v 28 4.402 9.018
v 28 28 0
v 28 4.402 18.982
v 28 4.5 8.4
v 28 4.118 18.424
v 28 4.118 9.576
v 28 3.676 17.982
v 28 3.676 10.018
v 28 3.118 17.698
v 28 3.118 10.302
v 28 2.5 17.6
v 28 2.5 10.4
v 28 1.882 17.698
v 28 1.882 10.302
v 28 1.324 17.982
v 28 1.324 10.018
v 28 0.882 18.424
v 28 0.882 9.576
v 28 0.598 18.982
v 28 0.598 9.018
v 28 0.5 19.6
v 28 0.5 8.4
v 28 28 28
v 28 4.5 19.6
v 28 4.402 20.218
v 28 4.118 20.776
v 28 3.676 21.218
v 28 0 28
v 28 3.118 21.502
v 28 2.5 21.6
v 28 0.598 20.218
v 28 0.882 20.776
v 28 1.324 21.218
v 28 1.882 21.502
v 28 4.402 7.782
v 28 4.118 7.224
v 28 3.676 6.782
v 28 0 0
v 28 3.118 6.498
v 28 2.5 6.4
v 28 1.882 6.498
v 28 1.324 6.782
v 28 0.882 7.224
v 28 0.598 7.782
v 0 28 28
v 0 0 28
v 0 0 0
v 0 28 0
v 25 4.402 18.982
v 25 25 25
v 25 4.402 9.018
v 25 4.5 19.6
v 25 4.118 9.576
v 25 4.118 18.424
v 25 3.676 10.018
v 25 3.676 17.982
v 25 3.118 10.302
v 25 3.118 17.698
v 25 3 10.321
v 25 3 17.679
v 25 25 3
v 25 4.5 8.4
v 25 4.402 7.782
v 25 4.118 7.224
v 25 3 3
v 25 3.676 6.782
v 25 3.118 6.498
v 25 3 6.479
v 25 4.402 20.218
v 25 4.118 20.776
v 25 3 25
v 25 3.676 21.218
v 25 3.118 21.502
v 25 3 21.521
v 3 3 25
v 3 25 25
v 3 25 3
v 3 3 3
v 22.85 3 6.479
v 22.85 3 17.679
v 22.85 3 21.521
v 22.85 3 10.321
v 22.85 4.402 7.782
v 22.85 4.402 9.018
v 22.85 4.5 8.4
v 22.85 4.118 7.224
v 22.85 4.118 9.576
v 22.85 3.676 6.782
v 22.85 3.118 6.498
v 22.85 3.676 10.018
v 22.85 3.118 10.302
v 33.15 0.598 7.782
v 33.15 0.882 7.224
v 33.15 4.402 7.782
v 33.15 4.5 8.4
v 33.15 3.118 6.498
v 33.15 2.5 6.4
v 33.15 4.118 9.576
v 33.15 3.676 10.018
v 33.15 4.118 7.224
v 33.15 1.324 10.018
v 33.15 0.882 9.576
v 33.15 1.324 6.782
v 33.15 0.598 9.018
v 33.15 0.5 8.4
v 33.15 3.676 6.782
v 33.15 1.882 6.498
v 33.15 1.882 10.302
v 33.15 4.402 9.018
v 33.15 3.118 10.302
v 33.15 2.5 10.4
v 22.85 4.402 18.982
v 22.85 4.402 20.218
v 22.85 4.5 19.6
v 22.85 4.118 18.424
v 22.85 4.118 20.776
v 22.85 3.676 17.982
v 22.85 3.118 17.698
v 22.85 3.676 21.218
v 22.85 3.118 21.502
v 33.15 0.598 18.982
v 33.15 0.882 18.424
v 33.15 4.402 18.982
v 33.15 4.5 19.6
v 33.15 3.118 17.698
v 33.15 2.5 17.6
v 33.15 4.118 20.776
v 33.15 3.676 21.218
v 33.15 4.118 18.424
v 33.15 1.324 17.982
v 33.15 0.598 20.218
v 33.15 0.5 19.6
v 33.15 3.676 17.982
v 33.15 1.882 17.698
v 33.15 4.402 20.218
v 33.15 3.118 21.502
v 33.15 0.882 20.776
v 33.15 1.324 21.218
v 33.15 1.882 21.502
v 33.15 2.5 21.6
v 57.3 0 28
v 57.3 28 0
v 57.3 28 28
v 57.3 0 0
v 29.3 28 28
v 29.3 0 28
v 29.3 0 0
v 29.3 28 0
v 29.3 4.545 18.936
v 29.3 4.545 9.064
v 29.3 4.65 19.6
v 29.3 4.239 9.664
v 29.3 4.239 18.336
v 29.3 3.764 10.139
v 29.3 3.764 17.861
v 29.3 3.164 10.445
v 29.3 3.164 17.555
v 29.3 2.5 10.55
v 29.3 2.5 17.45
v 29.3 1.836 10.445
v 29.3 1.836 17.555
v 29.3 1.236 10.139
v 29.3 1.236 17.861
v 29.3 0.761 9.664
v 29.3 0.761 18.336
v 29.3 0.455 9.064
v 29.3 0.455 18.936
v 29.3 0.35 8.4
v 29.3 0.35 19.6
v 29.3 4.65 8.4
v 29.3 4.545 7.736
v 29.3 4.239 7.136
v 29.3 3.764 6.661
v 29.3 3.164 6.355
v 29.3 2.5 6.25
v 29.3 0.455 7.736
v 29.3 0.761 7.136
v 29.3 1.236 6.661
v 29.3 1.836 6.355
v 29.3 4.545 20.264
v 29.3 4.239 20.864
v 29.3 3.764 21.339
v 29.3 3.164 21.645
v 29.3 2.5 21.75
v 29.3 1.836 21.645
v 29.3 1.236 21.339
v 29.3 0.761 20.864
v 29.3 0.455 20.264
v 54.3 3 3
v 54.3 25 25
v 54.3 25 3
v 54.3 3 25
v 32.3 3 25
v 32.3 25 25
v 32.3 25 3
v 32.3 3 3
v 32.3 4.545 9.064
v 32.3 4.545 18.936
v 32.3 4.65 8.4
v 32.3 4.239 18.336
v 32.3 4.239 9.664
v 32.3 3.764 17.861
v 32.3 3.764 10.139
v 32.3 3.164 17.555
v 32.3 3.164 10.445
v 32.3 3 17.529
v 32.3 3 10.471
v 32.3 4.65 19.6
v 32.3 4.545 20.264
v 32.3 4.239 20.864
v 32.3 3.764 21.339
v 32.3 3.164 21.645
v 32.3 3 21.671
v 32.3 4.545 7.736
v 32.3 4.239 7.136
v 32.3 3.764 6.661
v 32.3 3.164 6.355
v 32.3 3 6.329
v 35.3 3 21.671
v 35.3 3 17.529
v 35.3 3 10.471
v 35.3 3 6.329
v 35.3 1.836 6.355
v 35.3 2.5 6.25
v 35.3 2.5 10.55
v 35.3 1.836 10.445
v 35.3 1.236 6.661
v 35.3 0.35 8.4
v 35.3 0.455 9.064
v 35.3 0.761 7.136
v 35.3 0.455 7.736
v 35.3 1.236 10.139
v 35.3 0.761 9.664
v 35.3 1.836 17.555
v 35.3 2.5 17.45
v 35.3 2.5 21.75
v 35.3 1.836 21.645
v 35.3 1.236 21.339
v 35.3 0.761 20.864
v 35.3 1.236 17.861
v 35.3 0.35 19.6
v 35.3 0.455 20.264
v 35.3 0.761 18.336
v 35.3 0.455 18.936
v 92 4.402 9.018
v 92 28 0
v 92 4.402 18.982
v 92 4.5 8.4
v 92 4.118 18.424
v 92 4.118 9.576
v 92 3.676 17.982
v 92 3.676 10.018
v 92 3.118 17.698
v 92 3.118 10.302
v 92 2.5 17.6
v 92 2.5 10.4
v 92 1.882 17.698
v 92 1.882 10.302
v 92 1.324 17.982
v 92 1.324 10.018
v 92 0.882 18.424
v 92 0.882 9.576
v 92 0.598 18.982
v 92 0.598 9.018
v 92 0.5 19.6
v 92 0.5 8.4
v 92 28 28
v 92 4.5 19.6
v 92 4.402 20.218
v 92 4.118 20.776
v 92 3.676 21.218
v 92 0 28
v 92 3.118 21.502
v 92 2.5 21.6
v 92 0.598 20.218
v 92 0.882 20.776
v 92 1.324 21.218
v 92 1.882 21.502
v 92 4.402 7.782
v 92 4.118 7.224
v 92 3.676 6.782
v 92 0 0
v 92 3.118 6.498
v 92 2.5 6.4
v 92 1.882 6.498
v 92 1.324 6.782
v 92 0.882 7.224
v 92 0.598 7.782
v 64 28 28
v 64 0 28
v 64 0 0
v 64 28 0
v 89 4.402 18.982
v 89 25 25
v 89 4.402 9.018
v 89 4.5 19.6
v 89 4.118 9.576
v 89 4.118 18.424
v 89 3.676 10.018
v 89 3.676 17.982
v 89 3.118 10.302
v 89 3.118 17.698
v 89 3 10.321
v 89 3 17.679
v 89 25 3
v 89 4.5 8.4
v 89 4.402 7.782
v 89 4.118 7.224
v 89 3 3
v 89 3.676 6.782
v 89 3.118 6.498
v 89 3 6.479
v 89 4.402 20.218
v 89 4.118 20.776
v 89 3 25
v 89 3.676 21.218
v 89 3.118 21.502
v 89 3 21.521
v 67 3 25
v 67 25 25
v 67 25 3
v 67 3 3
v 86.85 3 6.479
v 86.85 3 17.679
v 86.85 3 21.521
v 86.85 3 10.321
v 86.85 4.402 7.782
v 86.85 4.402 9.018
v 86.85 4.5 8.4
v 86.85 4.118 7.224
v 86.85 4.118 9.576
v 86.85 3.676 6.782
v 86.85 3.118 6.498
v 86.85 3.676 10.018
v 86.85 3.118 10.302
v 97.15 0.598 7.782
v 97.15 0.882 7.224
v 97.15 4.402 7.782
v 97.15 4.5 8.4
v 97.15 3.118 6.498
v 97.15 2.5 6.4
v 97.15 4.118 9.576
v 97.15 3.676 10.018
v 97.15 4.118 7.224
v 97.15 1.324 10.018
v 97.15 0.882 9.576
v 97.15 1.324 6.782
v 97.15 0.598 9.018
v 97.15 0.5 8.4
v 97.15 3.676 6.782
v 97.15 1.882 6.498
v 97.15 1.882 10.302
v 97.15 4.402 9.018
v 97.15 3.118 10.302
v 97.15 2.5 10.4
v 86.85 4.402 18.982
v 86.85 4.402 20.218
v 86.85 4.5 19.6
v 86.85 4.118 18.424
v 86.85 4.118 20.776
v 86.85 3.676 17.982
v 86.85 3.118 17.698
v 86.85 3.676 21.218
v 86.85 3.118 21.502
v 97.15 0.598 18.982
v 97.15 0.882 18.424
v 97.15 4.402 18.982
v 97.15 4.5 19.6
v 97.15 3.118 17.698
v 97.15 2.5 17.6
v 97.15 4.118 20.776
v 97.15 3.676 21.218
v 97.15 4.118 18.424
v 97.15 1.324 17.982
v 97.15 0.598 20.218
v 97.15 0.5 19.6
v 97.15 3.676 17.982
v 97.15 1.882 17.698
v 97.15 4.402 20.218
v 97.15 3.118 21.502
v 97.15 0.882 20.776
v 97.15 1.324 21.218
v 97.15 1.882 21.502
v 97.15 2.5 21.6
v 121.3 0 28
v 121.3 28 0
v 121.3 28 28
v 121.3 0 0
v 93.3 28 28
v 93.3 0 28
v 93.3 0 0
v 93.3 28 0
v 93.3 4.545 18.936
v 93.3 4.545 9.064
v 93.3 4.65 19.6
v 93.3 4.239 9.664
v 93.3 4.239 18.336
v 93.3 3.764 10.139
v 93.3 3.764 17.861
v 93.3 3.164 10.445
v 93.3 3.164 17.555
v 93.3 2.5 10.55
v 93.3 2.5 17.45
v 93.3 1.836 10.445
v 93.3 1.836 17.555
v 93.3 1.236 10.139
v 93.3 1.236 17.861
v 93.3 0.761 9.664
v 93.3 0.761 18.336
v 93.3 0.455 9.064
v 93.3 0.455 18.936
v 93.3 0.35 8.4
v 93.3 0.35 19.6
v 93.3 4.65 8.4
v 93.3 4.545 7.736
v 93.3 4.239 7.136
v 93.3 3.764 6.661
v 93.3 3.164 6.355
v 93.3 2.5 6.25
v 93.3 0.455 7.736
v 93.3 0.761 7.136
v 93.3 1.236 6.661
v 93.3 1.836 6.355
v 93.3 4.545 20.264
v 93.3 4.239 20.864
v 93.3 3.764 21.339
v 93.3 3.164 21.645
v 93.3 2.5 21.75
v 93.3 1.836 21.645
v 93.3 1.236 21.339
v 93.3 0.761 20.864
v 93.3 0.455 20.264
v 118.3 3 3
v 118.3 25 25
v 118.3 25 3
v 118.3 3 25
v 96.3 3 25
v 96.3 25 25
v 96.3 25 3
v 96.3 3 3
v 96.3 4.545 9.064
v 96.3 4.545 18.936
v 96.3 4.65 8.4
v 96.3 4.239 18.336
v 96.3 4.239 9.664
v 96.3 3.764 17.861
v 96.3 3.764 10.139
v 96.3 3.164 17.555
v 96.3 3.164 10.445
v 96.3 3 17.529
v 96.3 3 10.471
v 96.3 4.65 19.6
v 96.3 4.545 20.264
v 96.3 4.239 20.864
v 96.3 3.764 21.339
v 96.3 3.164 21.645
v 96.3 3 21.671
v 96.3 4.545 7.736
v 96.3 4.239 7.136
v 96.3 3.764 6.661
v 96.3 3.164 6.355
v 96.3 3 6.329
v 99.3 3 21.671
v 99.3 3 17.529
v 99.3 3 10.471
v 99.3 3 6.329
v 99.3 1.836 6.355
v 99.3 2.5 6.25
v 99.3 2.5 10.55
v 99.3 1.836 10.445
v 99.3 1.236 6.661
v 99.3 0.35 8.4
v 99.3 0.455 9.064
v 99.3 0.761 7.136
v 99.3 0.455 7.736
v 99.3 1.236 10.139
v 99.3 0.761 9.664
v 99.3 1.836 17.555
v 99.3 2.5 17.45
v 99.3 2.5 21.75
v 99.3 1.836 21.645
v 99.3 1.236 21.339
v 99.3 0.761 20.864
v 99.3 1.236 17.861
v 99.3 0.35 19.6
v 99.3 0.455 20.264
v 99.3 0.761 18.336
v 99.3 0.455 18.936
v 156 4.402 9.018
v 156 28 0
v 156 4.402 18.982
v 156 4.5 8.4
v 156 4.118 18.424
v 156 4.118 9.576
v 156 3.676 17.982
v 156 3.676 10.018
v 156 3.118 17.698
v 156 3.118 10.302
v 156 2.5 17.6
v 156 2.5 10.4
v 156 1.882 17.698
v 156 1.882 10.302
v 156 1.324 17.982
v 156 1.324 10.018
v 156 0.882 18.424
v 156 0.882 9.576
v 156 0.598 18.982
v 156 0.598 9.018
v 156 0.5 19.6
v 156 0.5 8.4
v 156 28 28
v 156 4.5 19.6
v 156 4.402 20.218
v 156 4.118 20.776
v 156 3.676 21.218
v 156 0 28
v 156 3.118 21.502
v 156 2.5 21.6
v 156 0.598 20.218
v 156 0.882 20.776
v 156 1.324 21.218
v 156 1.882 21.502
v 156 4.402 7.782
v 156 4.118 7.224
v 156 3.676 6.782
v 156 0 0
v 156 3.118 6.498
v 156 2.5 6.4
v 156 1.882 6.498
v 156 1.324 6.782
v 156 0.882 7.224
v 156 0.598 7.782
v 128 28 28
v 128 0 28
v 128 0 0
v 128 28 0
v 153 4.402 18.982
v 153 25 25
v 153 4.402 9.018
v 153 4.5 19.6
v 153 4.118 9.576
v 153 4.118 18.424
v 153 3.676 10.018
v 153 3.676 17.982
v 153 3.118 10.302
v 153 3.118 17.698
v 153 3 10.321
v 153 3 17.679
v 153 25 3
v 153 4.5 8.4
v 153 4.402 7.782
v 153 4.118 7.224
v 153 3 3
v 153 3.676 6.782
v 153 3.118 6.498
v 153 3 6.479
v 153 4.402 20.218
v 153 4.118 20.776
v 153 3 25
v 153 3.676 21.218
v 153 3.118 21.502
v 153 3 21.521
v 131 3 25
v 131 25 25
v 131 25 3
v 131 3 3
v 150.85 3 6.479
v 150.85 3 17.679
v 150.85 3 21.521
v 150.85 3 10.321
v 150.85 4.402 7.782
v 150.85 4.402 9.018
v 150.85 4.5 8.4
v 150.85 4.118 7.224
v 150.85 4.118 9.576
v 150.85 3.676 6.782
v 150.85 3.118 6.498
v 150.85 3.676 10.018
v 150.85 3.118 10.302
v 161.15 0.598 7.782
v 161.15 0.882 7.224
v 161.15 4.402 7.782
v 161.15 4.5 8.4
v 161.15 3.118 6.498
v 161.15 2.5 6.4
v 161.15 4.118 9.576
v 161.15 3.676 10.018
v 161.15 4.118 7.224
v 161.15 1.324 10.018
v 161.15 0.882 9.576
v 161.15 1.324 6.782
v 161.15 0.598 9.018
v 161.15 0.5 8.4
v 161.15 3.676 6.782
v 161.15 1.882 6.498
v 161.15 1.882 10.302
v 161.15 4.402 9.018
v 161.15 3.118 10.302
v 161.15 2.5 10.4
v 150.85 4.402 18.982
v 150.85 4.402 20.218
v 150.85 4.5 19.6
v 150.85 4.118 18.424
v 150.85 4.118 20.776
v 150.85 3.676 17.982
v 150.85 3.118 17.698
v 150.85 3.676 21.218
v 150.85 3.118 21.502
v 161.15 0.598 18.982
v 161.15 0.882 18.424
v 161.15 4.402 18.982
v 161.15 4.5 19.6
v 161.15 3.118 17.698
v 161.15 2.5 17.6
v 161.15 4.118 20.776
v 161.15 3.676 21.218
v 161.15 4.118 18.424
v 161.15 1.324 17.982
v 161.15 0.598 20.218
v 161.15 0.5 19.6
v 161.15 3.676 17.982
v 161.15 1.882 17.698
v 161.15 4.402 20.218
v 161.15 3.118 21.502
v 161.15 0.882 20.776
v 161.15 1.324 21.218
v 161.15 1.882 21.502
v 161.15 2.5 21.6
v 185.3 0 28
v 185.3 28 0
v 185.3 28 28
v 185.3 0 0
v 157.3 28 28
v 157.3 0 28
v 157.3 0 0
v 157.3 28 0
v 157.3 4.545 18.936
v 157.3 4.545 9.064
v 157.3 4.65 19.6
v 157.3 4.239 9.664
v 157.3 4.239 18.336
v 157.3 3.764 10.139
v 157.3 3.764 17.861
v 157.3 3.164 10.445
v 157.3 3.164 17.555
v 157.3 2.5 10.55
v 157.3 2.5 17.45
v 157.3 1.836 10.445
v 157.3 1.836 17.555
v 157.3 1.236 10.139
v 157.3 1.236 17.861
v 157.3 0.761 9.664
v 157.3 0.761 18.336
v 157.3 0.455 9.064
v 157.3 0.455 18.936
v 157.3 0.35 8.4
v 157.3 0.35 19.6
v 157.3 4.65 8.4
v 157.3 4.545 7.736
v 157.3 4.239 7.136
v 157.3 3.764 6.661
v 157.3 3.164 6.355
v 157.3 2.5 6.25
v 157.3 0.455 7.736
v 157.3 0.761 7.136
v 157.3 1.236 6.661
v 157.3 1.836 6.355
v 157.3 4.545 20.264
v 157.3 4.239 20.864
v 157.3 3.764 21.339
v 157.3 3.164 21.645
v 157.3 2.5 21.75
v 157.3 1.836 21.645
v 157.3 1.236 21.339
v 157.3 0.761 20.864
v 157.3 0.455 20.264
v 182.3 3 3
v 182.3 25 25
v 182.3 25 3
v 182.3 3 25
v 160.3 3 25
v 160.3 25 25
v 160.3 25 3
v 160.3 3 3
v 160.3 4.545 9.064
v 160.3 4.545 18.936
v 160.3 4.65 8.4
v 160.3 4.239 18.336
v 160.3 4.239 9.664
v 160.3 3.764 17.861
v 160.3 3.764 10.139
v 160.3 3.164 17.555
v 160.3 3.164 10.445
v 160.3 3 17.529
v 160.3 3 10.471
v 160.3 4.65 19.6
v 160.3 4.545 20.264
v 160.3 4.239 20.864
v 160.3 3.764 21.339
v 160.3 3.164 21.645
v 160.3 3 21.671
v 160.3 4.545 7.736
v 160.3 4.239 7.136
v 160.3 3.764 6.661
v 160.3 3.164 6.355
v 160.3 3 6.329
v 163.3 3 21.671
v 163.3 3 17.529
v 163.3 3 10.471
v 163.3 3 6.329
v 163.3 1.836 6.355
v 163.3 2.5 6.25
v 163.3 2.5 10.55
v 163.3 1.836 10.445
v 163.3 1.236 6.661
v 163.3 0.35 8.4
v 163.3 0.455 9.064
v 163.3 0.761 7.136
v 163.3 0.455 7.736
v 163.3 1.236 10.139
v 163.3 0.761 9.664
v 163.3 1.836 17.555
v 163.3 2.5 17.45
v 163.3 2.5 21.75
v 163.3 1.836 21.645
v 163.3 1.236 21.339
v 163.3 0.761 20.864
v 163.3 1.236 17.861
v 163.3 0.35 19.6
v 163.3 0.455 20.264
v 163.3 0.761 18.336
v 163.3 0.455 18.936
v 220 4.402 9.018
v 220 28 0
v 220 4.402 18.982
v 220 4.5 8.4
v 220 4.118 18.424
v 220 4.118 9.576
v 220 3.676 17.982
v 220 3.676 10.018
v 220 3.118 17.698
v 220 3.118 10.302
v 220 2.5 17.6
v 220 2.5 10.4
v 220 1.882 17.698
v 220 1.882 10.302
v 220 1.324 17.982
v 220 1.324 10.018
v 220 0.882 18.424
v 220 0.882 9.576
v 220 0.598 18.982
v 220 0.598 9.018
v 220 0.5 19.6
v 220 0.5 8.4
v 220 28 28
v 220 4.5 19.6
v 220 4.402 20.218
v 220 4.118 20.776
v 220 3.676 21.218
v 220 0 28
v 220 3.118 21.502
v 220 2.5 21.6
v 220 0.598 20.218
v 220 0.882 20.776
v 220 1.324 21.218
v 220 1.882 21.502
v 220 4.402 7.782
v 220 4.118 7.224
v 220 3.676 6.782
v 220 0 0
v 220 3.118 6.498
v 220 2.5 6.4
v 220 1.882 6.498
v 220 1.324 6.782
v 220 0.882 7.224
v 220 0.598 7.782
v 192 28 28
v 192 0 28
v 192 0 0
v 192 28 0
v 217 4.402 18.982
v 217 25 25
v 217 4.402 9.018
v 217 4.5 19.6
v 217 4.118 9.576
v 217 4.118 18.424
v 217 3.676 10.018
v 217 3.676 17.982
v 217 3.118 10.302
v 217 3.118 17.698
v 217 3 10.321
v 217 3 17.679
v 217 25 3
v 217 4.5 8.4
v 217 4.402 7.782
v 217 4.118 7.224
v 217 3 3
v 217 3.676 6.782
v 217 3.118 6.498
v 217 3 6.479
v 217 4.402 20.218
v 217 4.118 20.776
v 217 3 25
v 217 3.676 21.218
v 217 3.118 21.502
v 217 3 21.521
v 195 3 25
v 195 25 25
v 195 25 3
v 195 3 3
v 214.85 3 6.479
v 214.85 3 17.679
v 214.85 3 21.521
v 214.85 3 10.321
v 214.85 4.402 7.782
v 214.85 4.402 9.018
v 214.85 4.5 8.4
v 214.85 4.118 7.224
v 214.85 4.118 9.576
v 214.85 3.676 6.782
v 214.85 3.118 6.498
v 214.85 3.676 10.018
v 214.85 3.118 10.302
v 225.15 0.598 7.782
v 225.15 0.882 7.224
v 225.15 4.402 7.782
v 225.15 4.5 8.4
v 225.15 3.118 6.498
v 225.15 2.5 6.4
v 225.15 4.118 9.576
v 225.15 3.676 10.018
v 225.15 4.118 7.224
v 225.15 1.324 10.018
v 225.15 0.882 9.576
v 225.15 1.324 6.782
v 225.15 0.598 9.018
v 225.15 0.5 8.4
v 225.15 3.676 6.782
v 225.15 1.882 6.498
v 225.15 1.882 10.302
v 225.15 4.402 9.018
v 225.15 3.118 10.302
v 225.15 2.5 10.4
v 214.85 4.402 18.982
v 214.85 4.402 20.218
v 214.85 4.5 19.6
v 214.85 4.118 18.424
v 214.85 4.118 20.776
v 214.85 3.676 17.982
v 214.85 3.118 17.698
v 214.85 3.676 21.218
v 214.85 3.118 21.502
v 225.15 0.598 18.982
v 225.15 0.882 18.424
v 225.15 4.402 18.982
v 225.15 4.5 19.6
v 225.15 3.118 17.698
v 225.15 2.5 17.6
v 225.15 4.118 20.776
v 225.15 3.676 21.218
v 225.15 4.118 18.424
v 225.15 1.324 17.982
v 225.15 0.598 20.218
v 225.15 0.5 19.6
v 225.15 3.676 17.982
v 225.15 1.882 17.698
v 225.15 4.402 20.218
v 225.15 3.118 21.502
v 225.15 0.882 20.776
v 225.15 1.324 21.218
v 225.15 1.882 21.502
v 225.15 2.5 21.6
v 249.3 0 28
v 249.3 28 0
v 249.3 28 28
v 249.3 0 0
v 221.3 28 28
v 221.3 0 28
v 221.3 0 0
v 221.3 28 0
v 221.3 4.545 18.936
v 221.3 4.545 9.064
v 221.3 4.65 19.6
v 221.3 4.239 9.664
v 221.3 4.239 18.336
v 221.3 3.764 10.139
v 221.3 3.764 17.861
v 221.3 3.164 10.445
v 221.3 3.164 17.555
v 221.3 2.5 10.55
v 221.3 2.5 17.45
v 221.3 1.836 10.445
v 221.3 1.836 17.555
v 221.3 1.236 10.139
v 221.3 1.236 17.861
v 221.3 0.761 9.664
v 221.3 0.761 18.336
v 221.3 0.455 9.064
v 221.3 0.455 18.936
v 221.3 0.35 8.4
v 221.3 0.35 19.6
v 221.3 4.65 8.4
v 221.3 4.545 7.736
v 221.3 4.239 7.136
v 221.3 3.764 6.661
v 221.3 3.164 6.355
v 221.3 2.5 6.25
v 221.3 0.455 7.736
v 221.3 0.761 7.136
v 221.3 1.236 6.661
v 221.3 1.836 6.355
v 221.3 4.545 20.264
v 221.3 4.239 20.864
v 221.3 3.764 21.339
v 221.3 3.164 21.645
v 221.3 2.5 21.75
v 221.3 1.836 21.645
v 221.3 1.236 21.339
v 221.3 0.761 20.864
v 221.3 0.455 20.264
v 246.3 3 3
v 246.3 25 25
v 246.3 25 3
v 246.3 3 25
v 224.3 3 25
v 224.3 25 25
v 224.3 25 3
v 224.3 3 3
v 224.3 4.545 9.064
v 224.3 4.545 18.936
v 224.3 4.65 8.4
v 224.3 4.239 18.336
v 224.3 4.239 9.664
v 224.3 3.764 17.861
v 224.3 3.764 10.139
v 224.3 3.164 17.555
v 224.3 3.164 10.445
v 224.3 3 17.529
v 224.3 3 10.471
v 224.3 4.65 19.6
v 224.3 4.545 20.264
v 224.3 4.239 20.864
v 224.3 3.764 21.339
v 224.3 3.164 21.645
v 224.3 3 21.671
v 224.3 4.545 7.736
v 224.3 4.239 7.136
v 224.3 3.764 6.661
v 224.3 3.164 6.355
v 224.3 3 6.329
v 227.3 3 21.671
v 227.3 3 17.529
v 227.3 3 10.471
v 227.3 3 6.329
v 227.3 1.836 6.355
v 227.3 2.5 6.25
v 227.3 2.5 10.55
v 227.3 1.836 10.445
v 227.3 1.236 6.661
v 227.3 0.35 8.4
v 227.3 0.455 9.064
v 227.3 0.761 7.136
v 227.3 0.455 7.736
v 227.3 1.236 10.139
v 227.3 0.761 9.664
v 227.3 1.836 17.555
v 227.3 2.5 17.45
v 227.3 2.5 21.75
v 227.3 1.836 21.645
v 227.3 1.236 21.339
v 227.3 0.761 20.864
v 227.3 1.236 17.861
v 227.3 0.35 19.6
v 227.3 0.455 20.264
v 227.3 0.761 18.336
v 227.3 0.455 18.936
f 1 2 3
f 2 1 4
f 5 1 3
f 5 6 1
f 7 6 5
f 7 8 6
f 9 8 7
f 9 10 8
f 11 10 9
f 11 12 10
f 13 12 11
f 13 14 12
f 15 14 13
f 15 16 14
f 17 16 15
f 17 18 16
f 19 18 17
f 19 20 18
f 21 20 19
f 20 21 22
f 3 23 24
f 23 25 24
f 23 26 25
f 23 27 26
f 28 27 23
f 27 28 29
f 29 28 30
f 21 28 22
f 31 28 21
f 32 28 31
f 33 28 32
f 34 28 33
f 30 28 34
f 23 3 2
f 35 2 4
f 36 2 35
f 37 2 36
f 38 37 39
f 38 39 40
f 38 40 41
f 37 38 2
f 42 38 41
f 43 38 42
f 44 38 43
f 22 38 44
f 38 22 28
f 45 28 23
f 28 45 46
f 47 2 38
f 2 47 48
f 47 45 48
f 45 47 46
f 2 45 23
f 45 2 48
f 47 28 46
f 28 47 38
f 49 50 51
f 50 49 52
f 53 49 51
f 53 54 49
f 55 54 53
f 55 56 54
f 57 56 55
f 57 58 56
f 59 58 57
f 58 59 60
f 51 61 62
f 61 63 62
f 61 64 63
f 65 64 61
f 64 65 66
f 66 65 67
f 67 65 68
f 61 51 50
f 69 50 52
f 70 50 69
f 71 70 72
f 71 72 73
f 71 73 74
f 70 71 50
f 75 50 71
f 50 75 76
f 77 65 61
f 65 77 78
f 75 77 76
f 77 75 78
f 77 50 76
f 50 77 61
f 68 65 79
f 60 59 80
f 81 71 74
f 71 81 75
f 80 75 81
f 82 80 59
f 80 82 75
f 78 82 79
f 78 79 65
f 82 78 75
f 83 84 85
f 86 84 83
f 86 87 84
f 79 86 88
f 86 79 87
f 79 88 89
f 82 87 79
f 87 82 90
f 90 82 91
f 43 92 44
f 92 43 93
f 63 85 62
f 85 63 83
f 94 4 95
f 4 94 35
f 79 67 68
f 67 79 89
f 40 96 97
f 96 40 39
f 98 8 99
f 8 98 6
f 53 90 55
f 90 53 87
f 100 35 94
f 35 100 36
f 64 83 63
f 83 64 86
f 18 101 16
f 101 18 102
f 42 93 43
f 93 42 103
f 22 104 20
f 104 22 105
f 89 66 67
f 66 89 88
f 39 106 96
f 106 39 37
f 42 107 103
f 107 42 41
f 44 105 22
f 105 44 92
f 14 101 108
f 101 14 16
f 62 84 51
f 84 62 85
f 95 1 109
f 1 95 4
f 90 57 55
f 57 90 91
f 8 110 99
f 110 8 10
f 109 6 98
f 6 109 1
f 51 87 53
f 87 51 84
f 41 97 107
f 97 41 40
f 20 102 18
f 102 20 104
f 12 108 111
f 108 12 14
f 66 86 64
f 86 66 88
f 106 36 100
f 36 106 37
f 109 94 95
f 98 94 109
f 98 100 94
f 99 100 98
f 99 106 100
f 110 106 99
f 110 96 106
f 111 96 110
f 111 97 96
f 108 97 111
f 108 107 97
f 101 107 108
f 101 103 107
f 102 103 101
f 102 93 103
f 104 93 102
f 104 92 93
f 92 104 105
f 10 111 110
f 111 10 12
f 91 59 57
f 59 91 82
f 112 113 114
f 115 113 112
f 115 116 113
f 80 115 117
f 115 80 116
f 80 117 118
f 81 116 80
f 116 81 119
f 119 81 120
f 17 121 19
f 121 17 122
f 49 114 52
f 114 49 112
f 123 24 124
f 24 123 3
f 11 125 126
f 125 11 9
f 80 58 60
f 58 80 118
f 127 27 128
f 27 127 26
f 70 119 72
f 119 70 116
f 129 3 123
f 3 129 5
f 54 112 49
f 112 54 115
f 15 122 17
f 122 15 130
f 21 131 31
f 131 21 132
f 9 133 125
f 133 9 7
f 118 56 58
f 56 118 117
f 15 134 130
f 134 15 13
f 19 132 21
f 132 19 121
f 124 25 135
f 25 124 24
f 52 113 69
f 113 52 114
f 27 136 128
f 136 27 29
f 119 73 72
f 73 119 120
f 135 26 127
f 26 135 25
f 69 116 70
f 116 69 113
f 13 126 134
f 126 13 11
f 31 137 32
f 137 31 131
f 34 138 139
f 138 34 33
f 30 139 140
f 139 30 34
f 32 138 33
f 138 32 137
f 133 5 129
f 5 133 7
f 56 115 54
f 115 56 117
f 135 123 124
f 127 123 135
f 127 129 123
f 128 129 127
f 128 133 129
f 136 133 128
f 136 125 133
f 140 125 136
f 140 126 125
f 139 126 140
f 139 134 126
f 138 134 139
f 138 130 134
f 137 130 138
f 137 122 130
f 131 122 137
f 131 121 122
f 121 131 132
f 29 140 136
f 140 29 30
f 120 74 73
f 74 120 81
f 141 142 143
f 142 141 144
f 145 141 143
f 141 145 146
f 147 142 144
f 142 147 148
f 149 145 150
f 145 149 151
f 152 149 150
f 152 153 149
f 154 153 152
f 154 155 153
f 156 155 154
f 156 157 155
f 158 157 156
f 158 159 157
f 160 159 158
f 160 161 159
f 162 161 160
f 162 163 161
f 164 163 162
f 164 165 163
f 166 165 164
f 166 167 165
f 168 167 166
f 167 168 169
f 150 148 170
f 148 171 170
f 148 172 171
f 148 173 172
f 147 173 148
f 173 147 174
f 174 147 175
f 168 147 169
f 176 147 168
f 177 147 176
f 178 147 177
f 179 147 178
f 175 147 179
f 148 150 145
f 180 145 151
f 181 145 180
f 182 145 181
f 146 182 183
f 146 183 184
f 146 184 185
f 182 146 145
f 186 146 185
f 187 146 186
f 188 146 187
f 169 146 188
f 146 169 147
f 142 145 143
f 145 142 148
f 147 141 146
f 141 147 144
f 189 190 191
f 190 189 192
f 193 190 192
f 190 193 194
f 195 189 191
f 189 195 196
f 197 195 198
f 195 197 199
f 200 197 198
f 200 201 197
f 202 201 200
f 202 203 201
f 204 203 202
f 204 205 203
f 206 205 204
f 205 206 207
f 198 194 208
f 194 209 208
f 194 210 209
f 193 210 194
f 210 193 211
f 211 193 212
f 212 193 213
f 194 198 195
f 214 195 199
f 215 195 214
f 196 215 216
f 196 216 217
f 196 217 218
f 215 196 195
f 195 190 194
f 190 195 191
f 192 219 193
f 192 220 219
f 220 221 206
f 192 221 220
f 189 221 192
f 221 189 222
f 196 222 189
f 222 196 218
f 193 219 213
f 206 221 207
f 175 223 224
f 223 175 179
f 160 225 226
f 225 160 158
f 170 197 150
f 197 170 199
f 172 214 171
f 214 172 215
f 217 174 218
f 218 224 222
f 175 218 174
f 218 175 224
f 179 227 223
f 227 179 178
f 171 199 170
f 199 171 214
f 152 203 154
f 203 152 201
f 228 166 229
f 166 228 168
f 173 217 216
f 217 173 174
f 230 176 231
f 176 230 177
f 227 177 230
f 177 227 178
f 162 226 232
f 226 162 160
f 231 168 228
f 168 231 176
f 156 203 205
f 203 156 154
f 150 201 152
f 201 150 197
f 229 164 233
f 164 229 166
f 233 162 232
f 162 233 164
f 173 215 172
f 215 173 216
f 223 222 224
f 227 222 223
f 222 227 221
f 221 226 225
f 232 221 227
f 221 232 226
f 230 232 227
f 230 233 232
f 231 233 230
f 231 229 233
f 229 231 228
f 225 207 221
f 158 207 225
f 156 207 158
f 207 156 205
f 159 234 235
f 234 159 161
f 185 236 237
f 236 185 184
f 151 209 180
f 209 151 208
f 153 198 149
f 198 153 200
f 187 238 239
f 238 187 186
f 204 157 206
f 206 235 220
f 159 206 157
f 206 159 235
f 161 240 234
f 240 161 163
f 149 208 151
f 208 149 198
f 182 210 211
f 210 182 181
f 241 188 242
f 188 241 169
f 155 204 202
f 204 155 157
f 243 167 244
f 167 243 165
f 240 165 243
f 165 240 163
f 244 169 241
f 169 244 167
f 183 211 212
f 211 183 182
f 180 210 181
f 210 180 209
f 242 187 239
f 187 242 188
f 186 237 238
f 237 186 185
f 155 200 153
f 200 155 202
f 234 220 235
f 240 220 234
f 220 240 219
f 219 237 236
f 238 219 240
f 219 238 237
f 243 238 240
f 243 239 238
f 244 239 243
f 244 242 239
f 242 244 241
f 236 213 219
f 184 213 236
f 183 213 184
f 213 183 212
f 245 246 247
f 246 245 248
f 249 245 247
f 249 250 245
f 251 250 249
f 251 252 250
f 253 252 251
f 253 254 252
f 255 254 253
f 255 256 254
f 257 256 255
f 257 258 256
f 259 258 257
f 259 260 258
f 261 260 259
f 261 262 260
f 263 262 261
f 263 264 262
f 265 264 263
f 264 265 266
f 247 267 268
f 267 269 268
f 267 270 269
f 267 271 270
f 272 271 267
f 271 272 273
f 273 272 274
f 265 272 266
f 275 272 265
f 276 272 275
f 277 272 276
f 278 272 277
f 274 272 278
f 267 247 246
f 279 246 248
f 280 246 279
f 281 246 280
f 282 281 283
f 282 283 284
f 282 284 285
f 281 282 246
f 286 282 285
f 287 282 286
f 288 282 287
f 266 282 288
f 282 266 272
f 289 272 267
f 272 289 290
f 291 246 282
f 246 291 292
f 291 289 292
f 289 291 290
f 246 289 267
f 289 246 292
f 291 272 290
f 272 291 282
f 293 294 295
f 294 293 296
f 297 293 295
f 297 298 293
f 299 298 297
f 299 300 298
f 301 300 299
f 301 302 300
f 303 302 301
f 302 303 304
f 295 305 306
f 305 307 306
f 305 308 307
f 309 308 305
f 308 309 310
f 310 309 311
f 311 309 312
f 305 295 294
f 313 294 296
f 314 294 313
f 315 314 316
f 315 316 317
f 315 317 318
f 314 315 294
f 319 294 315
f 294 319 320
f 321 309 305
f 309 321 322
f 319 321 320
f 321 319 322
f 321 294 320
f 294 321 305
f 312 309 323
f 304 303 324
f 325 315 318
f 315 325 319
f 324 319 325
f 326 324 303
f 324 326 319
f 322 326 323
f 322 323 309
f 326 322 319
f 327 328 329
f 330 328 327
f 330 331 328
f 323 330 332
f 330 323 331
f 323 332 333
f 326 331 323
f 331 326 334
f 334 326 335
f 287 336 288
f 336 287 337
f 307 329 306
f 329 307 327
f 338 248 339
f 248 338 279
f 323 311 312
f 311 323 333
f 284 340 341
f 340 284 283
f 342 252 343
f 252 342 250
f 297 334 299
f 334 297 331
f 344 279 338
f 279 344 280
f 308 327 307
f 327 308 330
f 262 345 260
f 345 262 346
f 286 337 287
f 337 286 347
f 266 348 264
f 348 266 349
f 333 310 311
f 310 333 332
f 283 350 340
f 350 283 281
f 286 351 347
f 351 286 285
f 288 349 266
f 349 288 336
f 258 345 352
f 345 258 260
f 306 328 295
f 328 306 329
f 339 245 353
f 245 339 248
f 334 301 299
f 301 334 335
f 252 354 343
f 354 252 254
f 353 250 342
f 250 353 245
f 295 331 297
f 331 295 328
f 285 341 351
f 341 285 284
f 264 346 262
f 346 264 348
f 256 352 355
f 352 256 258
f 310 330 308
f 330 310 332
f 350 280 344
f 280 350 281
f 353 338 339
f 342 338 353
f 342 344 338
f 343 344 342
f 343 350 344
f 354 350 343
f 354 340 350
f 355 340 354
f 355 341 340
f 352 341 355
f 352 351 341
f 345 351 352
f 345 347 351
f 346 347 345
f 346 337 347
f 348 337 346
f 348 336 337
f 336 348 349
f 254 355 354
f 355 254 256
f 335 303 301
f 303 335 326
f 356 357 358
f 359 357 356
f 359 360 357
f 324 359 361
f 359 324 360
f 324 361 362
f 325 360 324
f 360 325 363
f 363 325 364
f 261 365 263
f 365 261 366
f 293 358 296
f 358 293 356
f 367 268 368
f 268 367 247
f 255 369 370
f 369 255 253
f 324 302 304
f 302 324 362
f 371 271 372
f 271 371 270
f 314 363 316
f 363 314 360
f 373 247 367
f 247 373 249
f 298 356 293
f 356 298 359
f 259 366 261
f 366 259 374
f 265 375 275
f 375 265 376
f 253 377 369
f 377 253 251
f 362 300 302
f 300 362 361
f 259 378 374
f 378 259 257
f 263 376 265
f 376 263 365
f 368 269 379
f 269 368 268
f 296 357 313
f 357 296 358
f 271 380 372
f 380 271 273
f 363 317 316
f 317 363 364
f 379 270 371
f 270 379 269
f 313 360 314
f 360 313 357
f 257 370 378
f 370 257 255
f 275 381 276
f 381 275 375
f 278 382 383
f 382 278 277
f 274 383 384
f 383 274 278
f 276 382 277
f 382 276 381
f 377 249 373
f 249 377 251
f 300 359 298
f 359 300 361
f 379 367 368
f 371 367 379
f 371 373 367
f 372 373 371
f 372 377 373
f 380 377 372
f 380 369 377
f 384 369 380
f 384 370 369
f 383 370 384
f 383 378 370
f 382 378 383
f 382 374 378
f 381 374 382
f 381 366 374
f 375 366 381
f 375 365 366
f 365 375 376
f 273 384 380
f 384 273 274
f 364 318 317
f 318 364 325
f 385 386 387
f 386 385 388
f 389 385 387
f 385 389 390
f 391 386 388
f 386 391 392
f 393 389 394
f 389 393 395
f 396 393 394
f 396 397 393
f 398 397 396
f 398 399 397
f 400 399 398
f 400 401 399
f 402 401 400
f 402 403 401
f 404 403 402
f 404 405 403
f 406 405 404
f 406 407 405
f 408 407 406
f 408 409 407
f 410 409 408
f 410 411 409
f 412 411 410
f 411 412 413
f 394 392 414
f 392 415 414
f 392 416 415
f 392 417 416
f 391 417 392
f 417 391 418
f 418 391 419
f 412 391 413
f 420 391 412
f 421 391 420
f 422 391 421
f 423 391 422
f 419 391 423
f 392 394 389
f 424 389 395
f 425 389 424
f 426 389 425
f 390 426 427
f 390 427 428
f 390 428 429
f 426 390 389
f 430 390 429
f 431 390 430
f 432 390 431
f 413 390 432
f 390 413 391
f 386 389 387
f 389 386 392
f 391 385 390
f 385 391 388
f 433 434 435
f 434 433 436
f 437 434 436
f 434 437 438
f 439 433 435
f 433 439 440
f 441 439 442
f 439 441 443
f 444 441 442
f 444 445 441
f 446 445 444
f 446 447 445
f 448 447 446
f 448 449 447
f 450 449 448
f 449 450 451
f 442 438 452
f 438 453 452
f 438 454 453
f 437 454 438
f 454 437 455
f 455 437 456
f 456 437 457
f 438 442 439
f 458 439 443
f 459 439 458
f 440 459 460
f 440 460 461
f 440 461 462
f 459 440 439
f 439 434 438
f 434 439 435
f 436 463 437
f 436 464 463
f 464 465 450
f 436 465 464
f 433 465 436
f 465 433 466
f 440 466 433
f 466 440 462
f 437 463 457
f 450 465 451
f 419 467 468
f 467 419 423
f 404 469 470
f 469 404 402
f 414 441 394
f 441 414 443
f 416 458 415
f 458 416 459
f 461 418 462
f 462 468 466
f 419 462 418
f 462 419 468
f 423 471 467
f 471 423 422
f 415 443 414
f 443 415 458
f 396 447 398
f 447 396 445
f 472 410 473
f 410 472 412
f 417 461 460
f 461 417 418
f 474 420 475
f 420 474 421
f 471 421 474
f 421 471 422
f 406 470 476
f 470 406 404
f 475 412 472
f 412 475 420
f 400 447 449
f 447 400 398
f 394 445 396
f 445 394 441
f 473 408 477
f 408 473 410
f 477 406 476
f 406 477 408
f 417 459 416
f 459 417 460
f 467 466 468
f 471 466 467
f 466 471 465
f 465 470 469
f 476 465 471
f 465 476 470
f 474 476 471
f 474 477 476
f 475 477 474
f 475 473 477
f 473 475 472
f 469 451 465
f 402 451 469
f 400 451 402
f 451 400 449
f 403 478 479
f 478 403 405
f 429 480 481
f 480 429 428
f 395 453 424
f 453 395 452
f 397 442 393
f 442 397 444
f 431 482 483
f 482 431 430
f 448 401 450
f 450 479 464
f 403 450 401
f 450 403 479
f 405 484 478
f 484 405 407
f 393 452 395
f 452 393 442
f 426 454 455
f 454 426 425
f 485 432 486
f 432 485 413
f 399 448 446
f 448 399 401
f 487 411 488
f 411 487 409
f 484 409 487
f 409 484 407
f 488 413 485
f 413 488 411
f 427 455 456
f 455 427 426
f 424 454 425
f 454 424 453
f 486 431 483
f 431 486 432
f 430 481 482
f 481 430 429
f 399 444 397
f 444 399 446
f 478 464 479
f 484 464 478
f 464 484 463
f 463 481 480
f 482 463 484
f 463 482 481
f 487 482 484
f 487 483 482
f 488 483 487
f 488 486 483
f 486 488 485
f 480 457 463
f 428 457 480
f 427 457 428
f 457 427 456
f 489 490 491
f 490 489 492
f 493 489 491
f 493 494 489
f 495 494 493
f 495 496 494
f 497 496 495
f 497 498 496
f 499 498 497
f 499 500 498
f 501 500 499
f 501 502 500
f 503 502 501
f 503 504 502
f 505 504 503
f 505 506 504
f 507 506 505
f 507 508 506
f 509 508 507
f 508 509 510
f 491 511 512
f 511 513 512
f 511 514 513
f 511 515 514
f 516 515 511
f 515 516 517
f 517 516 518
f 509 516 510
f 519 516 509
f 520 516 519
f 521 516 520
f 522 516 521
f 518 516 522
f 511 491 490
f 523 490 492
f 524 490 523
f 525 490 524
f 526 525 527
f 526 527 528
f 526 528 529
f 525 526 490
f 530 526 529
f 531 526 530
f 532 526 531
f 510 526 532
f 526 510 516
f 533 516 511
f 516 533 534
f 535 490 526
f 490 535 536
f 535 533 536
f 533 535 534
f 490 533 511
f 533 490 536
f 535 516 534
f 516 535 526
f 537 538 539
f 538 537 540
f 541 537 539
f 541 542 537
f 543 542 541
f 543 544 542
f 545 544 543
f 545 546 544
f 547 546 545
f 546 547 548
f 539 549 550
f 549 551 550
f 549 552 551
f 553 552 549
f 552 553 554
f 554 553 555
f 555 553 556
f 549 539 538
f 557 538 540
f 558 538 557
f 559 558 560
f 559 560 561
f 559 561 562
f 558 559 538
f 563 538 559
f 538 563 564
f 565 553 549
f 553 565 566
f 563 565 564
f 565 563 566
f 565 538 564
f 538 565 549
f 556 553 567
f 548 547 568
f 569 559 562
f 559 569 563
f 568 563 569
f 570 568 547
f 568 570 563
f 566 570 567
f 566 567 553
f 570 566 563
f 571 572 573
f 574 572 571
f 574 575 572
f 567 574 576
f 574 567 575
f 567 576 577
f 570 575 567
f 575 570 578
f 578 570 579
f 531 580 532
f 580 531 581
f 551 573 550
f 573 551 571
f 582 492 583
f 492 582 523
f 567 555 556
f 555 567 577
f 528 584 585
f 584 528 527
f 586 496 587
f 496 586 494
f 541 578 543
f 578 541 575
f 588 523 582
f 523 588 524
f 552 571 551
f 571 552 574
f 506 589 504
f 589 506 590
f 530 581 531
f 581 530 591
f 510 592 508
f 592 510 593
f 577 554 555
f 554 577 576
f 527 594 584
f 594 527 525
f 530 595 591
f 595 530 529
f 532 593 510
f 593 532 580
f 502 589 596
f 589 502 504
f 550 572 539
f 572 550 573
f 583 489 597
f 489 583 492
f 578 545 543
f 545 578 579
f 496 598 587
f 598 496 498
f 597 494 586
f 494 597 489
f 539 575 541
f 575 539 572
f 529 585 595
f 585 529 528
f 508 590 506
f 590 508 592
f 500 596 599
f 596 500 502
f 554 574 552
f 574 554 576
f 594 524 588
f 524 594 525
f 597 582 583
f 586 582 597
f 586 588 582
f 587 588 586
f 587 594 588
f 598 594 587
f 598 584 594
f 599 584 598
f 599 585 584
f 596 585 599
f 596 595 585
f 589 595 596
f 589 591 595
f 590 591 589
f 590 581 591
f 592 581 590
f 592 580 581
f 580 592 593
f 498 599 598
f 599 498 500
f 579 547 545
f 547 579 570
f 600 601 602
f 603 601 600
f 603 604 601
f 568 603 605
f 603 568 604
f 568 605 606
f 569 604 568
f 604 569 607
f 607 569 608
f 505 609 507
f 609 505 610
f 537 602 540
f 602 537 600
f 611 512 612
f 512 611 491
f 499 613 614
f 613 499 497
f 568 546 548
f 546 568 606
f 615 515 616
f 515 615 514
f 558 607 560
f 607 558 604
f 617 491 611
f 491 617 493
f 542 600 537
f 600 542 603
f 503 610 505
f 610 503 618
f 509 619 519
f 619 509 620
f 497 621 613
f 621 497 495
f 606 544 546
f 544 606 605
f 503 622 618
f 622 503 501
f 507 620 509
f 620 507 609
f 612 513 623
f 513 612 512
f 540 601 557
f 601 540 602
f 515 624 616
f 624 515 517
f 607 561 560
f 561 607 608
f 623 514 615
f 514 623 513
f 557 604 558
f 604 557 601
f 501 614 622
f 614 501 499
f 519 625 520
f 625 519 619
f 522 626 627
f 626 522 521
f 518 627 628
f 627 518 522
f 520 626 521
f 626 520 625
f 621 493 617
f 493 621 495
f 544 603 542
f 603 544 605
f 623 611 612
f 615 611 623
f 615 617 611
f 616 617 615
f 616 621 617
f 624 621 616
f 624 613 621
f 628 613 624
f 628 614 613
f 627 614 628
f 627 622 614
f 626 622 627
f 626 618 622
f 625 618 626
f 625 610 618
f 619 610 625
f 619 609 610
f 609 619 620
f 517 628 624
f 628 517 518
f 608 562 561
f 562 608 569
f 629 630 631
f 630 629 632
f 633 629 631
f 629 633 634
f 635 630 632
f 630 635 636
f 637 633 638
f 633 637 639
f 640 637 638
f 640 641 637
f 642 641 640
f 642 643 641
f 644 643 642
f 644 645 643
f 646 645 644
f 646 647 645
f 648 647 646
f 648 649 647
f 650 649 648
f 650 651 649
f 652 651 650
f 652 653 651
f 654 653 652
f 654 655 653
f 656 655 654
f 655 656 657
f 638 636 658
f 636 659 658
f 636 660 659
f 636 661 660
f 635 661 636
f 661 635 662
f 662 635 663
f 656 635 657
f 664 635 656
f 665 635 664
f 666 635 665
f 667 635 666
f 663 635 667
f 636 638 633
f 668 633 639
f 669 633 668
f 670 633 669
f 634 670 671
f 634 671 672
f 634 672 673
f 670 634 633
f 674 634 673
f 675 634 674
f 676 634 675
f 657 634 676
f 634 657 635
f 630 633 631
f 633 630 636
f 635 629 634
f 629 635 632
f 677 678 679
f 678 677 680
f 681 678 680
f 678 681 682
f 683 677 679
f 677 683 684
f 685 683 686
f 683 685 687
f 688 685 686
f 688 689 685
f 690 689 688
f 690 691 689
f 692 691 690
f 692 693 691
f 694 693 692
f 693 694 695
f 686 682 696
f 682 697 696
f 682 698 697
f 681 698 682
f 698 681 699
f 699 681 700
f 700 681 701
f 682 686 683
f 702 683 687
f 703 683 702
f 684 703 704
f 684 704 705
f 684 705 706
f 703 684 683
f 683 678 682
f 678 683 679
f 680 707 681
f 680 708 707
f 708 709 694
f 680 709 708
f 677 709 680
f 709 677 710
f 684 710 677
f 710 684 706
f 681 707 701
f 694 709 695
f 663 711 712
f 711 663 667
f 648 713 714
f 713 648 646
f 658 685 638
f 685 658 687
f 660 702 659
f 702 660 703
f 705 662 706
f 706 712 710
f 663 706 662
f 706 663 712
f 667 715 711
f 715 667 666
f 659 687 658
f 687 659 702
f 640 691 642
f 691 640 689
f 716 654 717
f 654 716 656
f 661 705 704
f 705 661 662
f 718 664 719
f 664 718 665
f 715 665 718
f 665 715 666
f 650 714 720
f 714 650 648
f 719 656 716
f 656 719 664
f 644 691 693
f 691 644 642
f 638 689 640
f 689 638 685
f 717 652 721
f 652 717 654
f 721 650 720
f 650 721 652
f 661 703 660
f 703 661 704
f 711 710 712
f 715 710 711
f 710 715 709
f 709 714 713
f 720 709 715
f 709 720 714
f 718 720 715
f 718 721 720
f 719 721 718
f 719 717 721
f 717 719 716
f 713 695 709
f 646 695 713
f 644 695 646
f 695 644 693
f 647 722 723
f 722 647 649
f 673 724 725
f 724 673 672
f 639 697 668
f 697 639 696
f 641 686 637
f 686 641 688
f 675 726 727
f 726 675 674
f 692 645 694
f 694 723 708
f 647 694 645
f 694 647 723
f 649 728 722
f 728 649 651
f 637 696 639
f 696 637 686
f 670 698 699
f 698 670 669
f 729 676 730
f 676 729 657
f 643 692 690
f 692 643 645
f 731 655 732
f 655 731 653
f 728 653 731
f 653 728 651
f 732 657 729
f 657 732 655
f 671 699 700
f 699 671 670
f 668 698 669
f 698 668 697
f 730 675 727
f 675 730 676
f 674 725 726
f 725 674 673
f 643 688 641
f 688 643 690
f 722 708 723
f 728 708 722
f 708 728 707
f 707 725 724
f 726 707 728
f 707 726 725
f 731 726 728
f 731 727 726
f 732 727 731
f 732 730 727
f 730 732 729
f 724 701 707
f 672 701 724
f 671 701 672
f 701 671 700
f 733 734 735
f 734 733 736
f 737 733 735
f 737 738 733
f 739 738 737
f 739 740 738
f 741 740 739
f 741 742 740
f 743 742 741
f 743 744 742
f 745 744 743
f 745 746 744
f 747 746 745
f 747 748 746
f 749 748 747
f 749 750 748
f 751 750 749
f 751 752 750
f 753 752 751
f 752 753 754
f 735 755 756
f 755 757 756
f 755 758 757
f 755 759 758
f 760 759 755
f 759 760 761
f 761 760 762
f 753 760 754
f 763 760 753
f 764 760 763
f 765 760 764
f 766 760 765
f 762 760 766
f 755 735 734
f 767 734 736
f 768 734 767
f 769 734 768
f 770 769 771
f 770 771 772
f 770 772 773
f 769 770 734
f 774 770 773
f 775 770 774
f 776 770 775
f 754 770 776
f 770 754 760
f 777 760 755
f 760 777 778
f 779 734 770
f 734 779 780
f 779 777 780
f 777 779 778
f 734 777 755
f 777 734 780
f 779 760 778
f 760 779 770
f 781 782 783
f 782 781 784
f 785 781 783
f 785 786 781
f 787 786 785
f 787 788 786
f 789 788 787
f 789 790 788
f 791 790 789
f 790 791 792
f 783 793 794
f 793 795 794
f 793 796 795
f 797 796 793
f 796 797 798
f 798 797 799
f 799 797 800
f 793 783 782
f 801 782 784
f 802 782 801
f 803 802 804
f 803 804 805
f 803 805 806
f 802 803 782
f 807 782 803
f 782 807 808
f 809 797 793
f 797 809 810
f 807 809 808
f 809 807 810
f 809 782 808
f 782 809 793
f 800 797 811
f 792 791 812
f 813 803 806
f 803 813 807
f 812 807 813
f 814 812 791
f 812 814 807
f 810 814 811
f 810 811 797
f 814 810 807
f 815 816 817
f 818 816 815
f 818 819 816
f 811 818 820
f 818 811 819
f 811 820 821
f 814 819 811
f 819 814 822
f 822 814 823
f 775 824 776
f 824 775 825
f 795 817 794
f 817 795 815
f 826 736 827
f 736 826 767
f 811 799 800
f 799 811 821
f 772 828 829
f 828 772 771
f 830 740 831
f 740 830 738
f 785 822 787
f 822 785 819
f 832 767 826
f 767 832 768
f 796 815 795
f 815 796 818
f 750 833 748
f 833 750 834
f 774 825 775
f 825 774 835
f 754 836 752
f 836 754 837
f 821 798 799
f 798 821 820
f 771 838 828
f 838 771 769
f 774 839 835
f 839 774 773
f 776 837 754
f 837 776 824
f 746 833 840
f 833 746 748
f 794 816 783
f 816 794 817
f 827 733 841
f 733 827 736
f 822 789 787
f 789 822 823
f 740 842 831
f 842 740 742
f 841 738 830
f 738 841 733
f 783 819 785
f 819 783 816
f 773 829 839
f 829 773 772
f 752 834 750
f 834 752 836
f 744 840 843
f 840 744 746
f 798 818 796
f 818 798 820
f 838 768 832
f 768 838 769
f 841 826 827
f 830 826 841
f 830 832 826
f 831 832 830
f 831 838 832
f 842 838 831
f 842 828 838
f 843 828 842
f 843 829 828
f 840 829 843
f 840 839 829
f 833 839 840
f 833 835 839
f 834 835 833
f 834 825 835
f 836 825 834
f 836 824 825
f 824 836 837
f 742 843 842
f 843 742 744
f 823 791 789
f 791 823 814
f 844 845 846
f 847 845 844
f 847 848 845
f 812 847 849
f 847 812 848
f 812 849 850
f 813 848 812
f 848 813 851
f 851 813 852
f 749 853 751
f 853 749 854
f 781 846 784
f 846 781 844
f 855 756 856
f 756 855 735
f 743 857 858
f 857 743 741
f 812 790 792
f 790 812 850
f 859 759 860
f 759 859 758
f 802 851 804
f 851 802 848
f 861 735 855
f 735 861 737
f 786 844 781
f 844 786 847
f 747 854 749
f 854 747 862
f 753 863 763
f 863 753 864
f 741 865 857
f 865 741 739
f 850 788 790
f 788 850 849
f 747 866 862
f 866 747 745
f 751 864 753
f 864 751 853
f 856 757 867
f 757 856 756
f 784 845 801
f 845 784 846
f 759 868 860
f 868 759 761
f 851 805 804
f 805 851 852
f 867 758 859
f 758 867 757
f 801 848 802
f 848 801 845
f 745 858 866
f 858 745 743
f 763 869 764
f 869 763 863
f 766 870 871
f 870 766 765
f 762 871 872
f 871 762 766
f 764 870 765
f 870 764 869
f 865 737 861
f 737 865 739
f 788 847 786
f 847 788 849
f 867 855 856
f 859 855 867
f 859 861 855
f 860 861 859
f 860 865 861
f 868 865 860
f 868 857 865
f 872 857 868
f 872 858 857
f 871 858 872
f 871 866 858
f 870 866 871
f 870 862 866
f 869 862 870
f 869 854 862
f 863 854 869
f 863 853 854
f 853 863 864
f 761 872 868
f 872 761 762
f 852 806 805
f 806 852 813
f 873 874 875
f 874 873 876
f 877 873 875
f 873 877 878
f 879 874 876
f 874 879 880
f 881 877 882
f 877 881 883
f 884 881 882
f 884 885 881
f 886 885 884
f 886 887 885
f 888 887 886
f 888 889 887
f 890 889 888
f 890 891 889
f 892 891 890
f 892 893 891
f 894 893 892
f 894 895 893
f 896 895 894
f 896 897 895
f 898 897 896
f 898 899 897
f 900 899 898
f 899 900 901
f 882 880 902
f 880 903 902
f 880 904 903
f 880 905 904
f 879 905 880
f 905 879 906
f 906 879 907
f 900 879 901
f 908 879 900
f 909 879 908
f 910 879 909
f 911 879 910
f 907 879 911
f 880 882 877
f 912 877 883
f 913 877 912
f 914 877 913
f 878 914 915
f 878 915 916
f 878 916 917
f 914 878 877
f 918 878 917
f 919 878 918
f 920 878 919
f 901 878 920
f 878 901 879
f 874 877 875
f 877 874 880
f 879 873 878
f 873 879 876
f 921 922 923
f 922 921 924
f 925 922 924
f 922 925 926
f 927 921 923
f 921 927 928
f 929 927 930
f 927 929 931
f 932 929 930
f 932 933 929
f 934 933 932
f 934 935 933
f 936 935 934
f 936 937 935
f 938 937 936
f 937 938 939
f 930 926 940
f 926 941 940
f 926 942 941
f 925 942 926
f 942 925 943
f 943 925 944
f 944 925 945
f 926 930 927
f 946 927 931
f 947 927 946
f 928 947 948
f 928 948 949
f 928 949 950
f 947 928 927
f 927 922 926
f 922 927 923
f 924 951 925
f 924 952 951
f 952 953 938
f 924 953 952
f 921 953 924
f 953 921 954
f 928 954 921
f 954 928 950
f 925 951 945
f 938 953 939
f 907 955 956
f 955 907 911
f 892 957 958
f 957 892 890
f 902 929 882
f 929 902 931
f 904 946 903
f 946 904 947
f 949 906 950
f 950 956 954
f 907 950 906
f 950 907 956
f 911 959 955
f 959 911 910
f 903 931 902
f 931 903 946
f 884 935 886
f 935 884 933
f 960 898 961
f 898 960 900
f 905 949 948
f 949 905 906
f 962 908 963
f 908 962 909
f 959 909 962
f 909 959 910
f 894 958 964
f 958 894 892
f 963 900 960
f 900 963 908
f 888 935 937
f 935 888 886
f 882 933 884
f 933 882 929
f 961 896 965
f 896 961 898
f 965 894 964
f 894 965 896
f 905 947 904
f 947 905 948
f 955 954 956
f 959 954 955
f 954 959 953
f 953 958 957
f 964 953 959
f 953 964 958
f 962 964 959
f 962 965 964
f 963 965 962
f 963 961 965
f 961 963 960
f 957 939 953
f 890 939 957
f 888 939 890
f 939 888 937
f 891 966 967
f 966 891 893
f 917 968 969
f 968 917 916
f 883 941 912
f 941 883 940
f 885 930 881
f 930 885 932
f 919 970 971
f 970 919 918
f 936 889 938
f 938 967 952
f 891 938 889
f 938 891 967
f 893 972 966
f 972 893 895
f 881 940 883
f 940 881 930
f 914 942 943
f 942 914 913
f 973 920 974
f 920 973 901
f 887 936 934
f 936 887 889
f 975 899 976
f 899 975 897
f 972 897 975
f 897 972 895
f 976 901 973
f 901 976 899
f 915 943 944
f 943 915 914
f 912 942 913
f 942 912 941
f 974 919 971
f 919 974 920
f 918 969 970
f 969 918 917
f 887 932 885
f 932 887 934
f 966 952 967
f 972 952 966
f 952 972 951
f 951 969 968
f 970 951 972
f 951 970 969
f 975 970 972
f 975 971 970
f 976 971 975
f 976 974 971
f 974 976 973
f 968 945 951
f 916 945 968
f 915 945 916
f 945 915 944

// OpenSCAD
// Fidget Infinity Cube - 8 Hinged Cubes
// Each pair folds 360°, the set folds infinitely
// Print: 0.15mm, 3 walls, 30% infill
// CRITICAL: print hinge pairs together with 0.3mm gap

CUBE_S    = 28;    // Each sub-cube size
HINGE_D   = 4.0;  // Hinge pin diameter
HINGE_GAP = 0.3;  // Print-in-place clearance
HINGE_W   = 5.0;  // Hinge flange width

module sub_cube() {
    difference() {
        cube([CUBE_S, CUBE_S, CUBE_S]);
        // Hollow for weight / feel
        translate([3, 3, 3])
            cube([CUBE_S - 6, CUBE_S - 6, CUBE_S - 6]);
    }
}

module hinge_pin() {
    cylinder(d = HINGE_D, h = HINGE_W * 2 + HINGE_GAP, center = true, $fn = 20);
}

module hinge_socket() {
    difference() {
        cylinder(d = HINGE_D + 3.5, h = HINGE_W, center = true, $fn = 24);
        cylinder(d = HINGE_D + HINGE_GAP, h = HINGE_W + 1, center = true, $fn = 20);
    }
}

// One hinged pair — print these together
// Pair layout: two cubes side by side with hinge at shared edge
module hinge_pair(pair_idx) {
    // Cube A
    translate([0, 0, 0]) {
        sub_cube();
        // Hinge pins protruding from right face
        for (z = [CUBE_S * 0.3, CUBE_S * 0.7])
            translate([CUBE_S, HINGE_W/2, z])
                rotate([0, 90, 0]) hinge_pin();
    }

    // Cube B — gap = HINGE_GAP from cube A edge
    translate([CUBE_S + HINGE_GAP + 1, 0, 0]) {
        difference() {
            sub_cube();
            // Socket holes to receive pins
            for (z = [CUBE_S * 0.3, CUBE_S * 0.7])
                translate([-1, HINGE_W/2, z])
                    rotate([0, 90, 0])
                        cylinder(d = HINGE_D + HINGE_GAP, h = HINGE_W + 2, $fn = 20);
        }
    }
}

// Print 4 pairs
for (i = [0 : 3])
    translate([i * (CUBE_S * 2 + 8), 0, 0])
        hinge_pair(i);
